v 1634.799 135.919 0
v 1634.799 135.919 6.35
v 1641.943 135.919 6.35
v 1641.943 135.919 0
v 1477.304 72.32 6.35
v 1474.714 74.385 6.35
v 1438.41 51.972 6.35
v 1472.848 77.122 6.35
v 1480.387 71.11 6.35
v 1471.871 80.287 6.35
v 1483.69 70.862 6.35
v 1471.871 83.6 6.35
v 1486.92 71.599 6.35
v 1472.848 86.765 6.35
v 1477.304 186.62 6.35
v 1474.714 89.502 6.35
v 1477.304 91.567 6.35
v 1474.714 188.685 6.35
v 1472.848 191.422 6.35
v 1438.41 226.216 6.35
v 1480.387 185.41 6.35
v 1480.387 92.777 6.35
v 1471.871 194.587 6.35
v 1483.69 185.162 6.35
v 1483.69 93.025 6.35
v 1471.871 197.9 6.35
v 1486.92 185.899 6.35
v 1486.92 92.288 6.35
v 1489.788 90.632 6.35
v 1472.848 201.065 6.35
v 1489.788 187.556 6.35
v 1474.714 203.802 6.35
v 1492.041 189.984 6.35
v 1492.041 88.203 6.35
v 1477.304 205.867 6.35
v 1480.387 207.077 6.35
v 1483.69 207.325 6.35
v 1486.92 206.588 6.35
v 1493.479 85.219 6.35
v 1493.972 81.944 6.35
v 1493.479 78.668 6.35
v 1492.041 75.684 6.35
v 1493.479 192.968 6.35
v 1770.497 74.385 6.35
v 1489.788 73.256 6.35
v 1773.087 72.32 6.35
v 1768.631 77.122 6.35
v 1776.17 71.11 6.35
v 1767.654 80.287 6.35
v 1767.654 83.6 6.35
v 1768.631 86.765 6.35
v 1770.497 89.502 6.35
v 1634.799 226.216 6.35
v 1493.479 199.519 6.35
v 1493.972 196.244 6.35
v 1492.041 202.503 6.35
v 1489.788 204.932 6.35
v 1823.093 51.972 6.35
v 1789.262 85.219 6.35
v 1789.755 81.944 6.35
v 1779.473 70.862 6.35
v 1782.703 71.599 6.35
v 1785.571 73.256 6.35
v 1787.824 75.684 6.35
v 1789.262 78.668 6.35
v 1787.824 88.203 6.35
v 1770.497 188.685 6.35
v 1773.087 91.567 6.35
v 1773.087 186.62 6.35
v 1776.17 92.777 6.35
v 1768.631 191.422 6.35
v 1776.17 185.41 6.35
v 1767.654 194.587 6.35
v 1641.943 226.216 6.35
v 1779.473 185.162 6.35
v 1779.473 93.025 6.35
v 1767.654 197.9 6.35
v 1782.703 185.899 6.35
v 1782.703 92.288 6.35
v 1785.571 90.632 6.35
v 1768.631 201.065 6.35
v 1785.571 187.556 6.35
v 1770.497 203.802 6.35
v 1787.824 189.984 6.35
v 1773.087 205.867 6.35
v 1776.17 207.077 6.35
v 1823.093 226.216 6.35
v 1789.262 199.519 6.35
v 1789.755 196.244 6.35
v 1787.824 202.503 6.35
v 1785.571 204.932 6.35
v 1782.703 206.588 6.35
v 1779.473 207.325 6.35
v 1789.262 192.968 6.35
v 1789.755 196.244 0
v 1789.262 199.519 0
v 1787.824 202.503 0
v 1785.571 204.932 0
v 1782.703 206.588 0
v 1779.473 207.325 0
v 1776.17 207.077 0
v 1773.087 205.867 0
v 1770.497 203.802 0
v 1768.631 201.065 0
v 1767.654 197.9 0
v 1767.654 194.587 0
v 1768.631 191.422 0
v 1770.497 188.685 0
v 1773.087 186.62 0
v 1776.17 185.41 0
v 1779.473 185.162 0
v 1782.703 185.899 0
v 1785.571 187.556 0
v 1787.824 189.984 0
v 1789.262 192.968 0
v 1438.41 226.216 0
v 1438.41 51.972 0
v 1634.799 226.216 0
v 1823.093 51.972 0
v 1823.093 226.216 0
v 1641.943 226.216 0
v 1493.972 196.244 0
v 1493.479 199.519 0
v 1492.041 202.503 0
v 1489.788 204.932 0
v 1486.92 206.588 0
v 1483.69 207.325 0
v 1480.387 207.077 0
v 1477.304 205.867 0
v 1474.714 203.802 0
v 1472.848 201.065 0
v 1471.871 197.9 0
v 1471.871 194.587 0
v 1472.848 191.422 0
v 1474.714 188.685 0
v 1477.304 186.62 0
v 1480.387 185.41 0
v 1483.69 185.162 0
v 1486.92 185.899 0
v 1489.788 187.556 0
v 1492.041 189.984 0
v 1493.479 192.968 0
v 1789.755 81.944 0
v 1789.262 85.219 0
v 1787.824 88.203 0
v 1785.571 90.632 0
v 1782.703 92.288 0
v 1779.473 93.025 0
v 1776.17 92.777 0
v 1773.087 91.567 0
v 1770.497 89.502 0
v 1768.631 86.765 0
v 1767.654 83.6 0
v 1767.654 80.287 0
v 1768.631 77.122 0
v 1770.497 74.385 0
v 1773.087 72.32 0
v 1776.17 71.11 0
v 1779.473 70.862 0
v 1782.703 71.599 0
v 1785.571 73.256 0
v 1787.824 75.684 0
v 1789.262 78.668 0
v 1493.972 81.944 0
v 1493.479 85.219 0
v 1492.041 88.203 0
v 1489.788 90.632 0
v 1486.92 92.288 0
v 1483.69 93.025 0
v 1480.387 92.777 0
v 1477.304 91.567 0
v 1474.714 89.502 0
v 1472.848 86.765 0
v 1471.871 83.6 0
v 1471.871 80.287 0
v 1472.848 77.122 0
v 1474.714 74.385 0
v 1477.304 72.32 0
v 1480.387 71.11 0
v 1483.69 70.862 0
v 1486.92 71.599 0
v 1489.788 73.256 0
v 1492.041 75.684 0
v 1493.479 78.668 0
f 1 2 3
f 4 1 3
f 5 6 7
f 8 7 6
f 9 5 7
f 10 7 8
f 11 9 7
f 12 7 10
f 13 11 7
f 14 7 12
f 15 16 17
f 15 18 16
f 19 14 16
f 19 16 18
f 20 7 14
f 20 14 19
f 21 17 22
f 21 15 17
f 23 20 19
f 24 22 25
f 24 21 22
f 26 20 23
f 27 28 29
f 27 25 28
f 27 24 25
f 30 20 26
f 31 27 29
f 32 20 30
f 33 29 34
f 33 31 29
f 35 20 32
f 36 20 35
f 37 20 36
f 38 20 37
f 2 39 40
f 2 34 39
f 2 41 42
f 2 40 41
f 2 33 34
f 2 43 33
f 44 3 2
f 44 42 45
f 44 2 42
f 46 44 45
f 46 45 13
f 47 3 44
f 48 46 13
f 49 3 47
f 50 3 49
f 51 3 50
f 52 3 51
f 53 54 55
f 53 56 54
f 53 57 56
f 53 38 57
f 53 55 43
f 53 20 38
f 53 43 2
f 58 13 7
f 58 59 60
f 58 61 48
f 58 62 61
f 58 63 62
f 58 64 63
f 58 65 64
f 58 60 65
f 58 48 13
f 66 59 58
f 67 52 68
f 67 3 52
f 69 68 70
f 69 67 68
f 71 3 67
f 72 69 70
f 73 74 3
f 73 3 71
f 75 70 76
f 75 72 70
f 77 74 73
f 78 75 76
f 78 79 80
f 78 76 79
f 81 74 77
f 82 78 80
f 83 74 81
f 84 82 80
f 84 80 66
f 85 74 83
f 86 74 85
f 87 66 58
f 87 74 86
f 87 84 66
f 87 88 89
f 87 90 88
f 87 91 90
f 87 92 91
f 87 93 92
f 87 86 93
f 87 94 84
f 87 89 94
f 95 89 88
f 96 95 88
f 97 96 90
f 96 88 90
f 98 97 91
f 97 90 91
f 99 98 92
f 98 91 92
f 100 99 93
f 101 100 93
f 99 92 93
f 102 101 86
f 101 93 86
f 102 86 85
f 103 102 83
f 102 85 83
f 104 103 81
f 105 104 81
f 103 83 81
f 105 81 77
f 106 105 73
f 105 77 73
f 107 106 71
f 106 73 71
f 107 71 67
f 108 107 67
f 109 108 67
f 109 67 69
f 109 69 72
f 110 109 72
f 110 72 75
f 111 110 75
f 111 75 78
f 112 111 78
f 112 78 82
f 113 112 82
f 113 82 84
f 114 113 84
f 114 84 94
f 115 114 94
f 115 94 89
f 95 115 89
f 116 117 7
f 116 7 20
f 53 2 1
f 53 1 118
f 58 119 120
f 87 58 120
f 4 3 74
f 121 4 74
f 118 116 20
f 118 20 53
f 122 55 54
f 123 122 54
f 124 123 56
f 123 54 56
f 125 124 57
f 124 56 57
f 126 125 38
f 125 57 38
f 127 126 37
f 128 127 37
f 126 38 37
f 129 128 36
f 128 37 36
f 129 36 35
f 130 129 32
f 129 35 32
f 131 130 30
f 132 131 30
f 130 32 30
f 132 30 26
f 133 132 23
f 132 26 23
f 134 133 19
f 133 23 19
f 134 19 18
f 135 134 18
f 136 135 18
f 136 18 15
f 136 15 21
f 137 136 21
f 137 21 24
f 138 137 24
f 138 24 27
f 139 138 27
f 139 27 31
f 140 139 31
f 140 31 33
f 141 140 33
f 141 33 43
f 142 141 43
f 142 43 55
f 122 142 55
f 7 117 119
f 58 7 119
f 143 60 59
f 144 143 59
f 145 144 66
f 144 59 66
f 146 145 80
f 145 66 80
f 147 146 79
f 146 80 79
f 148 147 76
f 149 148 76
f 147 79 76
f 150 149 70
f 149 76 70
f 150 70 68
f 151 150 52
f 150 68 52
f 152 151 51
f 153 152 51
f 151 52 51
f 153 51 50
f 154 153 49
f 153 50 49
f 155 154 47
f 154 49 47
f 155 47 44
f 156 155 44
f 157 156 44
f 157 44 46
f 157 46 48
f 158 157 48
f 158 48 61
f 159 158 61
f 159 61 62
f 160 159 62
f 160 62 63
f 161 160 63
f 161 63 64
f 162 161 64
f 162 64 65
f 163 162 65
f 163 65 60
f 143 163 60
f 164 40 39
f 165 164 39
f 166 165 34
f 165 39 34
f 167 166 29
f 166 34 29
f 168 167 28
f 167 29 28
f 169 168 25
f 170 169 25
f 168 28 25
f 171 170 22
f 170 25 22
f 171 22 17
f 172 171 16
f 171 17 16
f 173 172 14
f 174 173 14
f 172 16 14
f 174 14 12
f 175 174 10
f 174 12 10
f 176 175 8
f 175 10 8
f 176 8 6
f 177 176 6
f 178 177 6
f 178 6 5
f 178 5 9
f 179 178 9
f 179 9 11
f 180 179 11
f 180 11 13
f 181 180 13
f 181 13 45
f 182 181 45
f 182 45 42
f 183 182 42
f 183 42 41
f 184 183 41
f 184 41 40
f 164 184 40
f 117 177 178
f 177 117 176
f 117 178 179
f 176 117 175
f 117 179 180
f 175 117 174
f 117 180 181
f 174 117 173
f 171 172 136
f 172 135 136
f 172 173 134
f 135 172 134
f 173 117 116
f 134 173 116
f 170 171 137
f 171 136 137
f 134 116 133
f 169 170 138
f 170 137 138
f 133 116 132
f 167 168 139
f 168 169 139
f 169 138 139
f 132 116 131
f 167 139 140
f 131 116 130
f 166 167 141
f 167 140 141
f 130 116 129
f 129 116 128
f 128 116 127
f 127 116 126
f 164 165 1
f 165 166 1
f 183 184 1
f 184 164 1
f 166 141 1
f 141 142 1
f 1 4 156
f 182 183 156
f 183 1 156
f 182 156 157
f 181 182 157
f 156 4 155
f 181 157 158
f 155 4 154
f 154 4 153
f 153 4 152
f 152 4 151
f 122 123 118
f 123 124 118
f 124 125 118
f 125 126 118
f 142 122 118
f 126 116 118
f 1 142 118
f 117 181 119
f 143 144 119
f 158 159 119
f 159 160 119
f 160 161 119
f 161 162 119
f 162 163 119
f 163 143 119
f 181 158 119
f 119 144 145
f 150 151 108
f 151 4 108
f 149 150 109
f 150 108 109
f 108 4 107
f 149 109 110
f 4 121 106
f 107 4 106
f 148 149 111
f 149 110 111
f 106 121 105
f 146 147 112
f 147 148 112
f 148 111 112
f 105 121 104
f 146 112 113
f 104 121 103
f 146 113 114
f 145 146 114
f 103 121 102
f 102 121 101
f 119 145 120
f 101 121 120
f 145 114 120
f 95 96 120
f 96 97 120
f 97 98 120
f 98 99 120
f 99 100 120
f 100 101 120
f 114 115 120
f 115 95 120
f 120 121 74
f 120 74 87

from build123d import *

# Parameters (mm, degrees)
SKETCH1_W           = 384.683
SKETCH1_H           = 174.244
BOSS_EXTRUDE1_DEPTH = 6.35
CUT_EXTRUDE1_REACH  = 1839.085
SKETCH2_R           = 11.1125
CUT_EXTRUDE2_REACH  = 1839.085
SKETCH3_W           = 7.14375
SKETCH3_H           = 90.297


with BuildPart() as part:
    # Sketch1 → Boss-Extrude1 (new body)
    with BuildSketch(Plane.XY):
        with Locations((1630.751253019, 139.093604852)):
            Rectangle(SKETCH1_W, SKETCH1_H)
    extrude(amount=BOSS_EXTRUDE1_DEPTH)

    # Sketch2 → Cut-Extrude1 (cut, up to next)
    with BuildSketch(Plane.XY.offset(6.35), mode=Mode.PRIVATE) as cut_extrude1_sk1:
        with Locations((1778.642753019, 196.243604852)):
            Circle(SKETCH2_R)
    cut_extrude1_tool1 = extrude(cut_extrude1_sk1.sketch, amount=-CUT_EXTRUDE1_REACH, mode=Mode.PRIVATE) & part.part
    # Sketch2 → Cut-Extrude1 (cut, up to next)
    with BuildSketch(Plane.XY.offset(6.35), mode=Mode.PRIVATE) as cut_extrude1_sk2:
        with Locations((1778.642753019, 81.943604852)):
            Circle(SKETCH2_R)
    cut_extrude1_tool2 = extrude(cut_extrude1_sk2.sketch, amount=-CUT_EXTRUDE1_REACH, mode=Mode.PRIVATE) & part.part
    # Sketch2 → Cut-Extrude1 (cut, up to next)
    with BuildSketch(Plane.XY.offset(6.35), mode=Mode.PRIVATE) as cut_extrude1_sk3:
        with Locations((1482.859753019, 196.243604852)):
            Circle(SKETCH2_R)
    cut_extrude1_tool3 = extrude(cut_extrude1_sk3.sketch, amount=-CUT_EXTRUDE1_REACH, mode=Mode.PRIVATE) & part.part
    # Sketch2 → Cut-Extrude1 (cut, up to next)
    with BuildSketch(Plane.XY.offset(6.35), mode=Mode.PRIVATE) as cut_extrude1_sk4:
        with Locations((1482.859753019, 81.943604852)):
            Circle(SKETCH2_R)
    cut_extrude1_tool4 = extrude(cut_extrude1_sk4.sketch, amount=-CUT_EXTRUDE1_REACH, mode=Mode.PRIVATE) & part.part
    add(cut_extrude1_tool1.solids().sort_by_distance((1778.642753, 196.243605, 6.35))[0], mode=Mode.SUBTRACT)
    add(cut_extrude1_tool2.solids().sort_by_distance((1778.642753, 81.943605, 6.35))[0], mode=Mode.SUBTRACT)
    add(cut_extrude1_tool3.solids().sort_by_distance((1482.859753, 196.243605, 6.35))[0], mode=Mode.SUBTRACT)
    add(cut_extrude1_tool4.solids().sort_by_distance((1482.859753, 81.943605, 6.35))[0], mode=Mode.SUBTRACT)

    # Sketch3 → Cut-Extrude2 (cut, up to next)
    with BuildSketch(Plane.XY.offset(6.35), mode=Mode.PRIVATE) as cut_extrude2_sk1:
        with Locations((1638.371253019, 181.067104852)):
            Rectangle(SKETCH3_W, SKETCH3_H)
    cut_extrude2_tool1 = extrude(cut_extrude2_sk1.sketch, amount=-CUT_EXTRUDE2_REACH, mode=Mode.PRIVATE) & part.part
    add(cut_extrude2_tool1.solids().sort_by_distance((1638.371253, 181.067105, 6.35))[0], mode=Mode.SUBTRACT)


solid = part.part
